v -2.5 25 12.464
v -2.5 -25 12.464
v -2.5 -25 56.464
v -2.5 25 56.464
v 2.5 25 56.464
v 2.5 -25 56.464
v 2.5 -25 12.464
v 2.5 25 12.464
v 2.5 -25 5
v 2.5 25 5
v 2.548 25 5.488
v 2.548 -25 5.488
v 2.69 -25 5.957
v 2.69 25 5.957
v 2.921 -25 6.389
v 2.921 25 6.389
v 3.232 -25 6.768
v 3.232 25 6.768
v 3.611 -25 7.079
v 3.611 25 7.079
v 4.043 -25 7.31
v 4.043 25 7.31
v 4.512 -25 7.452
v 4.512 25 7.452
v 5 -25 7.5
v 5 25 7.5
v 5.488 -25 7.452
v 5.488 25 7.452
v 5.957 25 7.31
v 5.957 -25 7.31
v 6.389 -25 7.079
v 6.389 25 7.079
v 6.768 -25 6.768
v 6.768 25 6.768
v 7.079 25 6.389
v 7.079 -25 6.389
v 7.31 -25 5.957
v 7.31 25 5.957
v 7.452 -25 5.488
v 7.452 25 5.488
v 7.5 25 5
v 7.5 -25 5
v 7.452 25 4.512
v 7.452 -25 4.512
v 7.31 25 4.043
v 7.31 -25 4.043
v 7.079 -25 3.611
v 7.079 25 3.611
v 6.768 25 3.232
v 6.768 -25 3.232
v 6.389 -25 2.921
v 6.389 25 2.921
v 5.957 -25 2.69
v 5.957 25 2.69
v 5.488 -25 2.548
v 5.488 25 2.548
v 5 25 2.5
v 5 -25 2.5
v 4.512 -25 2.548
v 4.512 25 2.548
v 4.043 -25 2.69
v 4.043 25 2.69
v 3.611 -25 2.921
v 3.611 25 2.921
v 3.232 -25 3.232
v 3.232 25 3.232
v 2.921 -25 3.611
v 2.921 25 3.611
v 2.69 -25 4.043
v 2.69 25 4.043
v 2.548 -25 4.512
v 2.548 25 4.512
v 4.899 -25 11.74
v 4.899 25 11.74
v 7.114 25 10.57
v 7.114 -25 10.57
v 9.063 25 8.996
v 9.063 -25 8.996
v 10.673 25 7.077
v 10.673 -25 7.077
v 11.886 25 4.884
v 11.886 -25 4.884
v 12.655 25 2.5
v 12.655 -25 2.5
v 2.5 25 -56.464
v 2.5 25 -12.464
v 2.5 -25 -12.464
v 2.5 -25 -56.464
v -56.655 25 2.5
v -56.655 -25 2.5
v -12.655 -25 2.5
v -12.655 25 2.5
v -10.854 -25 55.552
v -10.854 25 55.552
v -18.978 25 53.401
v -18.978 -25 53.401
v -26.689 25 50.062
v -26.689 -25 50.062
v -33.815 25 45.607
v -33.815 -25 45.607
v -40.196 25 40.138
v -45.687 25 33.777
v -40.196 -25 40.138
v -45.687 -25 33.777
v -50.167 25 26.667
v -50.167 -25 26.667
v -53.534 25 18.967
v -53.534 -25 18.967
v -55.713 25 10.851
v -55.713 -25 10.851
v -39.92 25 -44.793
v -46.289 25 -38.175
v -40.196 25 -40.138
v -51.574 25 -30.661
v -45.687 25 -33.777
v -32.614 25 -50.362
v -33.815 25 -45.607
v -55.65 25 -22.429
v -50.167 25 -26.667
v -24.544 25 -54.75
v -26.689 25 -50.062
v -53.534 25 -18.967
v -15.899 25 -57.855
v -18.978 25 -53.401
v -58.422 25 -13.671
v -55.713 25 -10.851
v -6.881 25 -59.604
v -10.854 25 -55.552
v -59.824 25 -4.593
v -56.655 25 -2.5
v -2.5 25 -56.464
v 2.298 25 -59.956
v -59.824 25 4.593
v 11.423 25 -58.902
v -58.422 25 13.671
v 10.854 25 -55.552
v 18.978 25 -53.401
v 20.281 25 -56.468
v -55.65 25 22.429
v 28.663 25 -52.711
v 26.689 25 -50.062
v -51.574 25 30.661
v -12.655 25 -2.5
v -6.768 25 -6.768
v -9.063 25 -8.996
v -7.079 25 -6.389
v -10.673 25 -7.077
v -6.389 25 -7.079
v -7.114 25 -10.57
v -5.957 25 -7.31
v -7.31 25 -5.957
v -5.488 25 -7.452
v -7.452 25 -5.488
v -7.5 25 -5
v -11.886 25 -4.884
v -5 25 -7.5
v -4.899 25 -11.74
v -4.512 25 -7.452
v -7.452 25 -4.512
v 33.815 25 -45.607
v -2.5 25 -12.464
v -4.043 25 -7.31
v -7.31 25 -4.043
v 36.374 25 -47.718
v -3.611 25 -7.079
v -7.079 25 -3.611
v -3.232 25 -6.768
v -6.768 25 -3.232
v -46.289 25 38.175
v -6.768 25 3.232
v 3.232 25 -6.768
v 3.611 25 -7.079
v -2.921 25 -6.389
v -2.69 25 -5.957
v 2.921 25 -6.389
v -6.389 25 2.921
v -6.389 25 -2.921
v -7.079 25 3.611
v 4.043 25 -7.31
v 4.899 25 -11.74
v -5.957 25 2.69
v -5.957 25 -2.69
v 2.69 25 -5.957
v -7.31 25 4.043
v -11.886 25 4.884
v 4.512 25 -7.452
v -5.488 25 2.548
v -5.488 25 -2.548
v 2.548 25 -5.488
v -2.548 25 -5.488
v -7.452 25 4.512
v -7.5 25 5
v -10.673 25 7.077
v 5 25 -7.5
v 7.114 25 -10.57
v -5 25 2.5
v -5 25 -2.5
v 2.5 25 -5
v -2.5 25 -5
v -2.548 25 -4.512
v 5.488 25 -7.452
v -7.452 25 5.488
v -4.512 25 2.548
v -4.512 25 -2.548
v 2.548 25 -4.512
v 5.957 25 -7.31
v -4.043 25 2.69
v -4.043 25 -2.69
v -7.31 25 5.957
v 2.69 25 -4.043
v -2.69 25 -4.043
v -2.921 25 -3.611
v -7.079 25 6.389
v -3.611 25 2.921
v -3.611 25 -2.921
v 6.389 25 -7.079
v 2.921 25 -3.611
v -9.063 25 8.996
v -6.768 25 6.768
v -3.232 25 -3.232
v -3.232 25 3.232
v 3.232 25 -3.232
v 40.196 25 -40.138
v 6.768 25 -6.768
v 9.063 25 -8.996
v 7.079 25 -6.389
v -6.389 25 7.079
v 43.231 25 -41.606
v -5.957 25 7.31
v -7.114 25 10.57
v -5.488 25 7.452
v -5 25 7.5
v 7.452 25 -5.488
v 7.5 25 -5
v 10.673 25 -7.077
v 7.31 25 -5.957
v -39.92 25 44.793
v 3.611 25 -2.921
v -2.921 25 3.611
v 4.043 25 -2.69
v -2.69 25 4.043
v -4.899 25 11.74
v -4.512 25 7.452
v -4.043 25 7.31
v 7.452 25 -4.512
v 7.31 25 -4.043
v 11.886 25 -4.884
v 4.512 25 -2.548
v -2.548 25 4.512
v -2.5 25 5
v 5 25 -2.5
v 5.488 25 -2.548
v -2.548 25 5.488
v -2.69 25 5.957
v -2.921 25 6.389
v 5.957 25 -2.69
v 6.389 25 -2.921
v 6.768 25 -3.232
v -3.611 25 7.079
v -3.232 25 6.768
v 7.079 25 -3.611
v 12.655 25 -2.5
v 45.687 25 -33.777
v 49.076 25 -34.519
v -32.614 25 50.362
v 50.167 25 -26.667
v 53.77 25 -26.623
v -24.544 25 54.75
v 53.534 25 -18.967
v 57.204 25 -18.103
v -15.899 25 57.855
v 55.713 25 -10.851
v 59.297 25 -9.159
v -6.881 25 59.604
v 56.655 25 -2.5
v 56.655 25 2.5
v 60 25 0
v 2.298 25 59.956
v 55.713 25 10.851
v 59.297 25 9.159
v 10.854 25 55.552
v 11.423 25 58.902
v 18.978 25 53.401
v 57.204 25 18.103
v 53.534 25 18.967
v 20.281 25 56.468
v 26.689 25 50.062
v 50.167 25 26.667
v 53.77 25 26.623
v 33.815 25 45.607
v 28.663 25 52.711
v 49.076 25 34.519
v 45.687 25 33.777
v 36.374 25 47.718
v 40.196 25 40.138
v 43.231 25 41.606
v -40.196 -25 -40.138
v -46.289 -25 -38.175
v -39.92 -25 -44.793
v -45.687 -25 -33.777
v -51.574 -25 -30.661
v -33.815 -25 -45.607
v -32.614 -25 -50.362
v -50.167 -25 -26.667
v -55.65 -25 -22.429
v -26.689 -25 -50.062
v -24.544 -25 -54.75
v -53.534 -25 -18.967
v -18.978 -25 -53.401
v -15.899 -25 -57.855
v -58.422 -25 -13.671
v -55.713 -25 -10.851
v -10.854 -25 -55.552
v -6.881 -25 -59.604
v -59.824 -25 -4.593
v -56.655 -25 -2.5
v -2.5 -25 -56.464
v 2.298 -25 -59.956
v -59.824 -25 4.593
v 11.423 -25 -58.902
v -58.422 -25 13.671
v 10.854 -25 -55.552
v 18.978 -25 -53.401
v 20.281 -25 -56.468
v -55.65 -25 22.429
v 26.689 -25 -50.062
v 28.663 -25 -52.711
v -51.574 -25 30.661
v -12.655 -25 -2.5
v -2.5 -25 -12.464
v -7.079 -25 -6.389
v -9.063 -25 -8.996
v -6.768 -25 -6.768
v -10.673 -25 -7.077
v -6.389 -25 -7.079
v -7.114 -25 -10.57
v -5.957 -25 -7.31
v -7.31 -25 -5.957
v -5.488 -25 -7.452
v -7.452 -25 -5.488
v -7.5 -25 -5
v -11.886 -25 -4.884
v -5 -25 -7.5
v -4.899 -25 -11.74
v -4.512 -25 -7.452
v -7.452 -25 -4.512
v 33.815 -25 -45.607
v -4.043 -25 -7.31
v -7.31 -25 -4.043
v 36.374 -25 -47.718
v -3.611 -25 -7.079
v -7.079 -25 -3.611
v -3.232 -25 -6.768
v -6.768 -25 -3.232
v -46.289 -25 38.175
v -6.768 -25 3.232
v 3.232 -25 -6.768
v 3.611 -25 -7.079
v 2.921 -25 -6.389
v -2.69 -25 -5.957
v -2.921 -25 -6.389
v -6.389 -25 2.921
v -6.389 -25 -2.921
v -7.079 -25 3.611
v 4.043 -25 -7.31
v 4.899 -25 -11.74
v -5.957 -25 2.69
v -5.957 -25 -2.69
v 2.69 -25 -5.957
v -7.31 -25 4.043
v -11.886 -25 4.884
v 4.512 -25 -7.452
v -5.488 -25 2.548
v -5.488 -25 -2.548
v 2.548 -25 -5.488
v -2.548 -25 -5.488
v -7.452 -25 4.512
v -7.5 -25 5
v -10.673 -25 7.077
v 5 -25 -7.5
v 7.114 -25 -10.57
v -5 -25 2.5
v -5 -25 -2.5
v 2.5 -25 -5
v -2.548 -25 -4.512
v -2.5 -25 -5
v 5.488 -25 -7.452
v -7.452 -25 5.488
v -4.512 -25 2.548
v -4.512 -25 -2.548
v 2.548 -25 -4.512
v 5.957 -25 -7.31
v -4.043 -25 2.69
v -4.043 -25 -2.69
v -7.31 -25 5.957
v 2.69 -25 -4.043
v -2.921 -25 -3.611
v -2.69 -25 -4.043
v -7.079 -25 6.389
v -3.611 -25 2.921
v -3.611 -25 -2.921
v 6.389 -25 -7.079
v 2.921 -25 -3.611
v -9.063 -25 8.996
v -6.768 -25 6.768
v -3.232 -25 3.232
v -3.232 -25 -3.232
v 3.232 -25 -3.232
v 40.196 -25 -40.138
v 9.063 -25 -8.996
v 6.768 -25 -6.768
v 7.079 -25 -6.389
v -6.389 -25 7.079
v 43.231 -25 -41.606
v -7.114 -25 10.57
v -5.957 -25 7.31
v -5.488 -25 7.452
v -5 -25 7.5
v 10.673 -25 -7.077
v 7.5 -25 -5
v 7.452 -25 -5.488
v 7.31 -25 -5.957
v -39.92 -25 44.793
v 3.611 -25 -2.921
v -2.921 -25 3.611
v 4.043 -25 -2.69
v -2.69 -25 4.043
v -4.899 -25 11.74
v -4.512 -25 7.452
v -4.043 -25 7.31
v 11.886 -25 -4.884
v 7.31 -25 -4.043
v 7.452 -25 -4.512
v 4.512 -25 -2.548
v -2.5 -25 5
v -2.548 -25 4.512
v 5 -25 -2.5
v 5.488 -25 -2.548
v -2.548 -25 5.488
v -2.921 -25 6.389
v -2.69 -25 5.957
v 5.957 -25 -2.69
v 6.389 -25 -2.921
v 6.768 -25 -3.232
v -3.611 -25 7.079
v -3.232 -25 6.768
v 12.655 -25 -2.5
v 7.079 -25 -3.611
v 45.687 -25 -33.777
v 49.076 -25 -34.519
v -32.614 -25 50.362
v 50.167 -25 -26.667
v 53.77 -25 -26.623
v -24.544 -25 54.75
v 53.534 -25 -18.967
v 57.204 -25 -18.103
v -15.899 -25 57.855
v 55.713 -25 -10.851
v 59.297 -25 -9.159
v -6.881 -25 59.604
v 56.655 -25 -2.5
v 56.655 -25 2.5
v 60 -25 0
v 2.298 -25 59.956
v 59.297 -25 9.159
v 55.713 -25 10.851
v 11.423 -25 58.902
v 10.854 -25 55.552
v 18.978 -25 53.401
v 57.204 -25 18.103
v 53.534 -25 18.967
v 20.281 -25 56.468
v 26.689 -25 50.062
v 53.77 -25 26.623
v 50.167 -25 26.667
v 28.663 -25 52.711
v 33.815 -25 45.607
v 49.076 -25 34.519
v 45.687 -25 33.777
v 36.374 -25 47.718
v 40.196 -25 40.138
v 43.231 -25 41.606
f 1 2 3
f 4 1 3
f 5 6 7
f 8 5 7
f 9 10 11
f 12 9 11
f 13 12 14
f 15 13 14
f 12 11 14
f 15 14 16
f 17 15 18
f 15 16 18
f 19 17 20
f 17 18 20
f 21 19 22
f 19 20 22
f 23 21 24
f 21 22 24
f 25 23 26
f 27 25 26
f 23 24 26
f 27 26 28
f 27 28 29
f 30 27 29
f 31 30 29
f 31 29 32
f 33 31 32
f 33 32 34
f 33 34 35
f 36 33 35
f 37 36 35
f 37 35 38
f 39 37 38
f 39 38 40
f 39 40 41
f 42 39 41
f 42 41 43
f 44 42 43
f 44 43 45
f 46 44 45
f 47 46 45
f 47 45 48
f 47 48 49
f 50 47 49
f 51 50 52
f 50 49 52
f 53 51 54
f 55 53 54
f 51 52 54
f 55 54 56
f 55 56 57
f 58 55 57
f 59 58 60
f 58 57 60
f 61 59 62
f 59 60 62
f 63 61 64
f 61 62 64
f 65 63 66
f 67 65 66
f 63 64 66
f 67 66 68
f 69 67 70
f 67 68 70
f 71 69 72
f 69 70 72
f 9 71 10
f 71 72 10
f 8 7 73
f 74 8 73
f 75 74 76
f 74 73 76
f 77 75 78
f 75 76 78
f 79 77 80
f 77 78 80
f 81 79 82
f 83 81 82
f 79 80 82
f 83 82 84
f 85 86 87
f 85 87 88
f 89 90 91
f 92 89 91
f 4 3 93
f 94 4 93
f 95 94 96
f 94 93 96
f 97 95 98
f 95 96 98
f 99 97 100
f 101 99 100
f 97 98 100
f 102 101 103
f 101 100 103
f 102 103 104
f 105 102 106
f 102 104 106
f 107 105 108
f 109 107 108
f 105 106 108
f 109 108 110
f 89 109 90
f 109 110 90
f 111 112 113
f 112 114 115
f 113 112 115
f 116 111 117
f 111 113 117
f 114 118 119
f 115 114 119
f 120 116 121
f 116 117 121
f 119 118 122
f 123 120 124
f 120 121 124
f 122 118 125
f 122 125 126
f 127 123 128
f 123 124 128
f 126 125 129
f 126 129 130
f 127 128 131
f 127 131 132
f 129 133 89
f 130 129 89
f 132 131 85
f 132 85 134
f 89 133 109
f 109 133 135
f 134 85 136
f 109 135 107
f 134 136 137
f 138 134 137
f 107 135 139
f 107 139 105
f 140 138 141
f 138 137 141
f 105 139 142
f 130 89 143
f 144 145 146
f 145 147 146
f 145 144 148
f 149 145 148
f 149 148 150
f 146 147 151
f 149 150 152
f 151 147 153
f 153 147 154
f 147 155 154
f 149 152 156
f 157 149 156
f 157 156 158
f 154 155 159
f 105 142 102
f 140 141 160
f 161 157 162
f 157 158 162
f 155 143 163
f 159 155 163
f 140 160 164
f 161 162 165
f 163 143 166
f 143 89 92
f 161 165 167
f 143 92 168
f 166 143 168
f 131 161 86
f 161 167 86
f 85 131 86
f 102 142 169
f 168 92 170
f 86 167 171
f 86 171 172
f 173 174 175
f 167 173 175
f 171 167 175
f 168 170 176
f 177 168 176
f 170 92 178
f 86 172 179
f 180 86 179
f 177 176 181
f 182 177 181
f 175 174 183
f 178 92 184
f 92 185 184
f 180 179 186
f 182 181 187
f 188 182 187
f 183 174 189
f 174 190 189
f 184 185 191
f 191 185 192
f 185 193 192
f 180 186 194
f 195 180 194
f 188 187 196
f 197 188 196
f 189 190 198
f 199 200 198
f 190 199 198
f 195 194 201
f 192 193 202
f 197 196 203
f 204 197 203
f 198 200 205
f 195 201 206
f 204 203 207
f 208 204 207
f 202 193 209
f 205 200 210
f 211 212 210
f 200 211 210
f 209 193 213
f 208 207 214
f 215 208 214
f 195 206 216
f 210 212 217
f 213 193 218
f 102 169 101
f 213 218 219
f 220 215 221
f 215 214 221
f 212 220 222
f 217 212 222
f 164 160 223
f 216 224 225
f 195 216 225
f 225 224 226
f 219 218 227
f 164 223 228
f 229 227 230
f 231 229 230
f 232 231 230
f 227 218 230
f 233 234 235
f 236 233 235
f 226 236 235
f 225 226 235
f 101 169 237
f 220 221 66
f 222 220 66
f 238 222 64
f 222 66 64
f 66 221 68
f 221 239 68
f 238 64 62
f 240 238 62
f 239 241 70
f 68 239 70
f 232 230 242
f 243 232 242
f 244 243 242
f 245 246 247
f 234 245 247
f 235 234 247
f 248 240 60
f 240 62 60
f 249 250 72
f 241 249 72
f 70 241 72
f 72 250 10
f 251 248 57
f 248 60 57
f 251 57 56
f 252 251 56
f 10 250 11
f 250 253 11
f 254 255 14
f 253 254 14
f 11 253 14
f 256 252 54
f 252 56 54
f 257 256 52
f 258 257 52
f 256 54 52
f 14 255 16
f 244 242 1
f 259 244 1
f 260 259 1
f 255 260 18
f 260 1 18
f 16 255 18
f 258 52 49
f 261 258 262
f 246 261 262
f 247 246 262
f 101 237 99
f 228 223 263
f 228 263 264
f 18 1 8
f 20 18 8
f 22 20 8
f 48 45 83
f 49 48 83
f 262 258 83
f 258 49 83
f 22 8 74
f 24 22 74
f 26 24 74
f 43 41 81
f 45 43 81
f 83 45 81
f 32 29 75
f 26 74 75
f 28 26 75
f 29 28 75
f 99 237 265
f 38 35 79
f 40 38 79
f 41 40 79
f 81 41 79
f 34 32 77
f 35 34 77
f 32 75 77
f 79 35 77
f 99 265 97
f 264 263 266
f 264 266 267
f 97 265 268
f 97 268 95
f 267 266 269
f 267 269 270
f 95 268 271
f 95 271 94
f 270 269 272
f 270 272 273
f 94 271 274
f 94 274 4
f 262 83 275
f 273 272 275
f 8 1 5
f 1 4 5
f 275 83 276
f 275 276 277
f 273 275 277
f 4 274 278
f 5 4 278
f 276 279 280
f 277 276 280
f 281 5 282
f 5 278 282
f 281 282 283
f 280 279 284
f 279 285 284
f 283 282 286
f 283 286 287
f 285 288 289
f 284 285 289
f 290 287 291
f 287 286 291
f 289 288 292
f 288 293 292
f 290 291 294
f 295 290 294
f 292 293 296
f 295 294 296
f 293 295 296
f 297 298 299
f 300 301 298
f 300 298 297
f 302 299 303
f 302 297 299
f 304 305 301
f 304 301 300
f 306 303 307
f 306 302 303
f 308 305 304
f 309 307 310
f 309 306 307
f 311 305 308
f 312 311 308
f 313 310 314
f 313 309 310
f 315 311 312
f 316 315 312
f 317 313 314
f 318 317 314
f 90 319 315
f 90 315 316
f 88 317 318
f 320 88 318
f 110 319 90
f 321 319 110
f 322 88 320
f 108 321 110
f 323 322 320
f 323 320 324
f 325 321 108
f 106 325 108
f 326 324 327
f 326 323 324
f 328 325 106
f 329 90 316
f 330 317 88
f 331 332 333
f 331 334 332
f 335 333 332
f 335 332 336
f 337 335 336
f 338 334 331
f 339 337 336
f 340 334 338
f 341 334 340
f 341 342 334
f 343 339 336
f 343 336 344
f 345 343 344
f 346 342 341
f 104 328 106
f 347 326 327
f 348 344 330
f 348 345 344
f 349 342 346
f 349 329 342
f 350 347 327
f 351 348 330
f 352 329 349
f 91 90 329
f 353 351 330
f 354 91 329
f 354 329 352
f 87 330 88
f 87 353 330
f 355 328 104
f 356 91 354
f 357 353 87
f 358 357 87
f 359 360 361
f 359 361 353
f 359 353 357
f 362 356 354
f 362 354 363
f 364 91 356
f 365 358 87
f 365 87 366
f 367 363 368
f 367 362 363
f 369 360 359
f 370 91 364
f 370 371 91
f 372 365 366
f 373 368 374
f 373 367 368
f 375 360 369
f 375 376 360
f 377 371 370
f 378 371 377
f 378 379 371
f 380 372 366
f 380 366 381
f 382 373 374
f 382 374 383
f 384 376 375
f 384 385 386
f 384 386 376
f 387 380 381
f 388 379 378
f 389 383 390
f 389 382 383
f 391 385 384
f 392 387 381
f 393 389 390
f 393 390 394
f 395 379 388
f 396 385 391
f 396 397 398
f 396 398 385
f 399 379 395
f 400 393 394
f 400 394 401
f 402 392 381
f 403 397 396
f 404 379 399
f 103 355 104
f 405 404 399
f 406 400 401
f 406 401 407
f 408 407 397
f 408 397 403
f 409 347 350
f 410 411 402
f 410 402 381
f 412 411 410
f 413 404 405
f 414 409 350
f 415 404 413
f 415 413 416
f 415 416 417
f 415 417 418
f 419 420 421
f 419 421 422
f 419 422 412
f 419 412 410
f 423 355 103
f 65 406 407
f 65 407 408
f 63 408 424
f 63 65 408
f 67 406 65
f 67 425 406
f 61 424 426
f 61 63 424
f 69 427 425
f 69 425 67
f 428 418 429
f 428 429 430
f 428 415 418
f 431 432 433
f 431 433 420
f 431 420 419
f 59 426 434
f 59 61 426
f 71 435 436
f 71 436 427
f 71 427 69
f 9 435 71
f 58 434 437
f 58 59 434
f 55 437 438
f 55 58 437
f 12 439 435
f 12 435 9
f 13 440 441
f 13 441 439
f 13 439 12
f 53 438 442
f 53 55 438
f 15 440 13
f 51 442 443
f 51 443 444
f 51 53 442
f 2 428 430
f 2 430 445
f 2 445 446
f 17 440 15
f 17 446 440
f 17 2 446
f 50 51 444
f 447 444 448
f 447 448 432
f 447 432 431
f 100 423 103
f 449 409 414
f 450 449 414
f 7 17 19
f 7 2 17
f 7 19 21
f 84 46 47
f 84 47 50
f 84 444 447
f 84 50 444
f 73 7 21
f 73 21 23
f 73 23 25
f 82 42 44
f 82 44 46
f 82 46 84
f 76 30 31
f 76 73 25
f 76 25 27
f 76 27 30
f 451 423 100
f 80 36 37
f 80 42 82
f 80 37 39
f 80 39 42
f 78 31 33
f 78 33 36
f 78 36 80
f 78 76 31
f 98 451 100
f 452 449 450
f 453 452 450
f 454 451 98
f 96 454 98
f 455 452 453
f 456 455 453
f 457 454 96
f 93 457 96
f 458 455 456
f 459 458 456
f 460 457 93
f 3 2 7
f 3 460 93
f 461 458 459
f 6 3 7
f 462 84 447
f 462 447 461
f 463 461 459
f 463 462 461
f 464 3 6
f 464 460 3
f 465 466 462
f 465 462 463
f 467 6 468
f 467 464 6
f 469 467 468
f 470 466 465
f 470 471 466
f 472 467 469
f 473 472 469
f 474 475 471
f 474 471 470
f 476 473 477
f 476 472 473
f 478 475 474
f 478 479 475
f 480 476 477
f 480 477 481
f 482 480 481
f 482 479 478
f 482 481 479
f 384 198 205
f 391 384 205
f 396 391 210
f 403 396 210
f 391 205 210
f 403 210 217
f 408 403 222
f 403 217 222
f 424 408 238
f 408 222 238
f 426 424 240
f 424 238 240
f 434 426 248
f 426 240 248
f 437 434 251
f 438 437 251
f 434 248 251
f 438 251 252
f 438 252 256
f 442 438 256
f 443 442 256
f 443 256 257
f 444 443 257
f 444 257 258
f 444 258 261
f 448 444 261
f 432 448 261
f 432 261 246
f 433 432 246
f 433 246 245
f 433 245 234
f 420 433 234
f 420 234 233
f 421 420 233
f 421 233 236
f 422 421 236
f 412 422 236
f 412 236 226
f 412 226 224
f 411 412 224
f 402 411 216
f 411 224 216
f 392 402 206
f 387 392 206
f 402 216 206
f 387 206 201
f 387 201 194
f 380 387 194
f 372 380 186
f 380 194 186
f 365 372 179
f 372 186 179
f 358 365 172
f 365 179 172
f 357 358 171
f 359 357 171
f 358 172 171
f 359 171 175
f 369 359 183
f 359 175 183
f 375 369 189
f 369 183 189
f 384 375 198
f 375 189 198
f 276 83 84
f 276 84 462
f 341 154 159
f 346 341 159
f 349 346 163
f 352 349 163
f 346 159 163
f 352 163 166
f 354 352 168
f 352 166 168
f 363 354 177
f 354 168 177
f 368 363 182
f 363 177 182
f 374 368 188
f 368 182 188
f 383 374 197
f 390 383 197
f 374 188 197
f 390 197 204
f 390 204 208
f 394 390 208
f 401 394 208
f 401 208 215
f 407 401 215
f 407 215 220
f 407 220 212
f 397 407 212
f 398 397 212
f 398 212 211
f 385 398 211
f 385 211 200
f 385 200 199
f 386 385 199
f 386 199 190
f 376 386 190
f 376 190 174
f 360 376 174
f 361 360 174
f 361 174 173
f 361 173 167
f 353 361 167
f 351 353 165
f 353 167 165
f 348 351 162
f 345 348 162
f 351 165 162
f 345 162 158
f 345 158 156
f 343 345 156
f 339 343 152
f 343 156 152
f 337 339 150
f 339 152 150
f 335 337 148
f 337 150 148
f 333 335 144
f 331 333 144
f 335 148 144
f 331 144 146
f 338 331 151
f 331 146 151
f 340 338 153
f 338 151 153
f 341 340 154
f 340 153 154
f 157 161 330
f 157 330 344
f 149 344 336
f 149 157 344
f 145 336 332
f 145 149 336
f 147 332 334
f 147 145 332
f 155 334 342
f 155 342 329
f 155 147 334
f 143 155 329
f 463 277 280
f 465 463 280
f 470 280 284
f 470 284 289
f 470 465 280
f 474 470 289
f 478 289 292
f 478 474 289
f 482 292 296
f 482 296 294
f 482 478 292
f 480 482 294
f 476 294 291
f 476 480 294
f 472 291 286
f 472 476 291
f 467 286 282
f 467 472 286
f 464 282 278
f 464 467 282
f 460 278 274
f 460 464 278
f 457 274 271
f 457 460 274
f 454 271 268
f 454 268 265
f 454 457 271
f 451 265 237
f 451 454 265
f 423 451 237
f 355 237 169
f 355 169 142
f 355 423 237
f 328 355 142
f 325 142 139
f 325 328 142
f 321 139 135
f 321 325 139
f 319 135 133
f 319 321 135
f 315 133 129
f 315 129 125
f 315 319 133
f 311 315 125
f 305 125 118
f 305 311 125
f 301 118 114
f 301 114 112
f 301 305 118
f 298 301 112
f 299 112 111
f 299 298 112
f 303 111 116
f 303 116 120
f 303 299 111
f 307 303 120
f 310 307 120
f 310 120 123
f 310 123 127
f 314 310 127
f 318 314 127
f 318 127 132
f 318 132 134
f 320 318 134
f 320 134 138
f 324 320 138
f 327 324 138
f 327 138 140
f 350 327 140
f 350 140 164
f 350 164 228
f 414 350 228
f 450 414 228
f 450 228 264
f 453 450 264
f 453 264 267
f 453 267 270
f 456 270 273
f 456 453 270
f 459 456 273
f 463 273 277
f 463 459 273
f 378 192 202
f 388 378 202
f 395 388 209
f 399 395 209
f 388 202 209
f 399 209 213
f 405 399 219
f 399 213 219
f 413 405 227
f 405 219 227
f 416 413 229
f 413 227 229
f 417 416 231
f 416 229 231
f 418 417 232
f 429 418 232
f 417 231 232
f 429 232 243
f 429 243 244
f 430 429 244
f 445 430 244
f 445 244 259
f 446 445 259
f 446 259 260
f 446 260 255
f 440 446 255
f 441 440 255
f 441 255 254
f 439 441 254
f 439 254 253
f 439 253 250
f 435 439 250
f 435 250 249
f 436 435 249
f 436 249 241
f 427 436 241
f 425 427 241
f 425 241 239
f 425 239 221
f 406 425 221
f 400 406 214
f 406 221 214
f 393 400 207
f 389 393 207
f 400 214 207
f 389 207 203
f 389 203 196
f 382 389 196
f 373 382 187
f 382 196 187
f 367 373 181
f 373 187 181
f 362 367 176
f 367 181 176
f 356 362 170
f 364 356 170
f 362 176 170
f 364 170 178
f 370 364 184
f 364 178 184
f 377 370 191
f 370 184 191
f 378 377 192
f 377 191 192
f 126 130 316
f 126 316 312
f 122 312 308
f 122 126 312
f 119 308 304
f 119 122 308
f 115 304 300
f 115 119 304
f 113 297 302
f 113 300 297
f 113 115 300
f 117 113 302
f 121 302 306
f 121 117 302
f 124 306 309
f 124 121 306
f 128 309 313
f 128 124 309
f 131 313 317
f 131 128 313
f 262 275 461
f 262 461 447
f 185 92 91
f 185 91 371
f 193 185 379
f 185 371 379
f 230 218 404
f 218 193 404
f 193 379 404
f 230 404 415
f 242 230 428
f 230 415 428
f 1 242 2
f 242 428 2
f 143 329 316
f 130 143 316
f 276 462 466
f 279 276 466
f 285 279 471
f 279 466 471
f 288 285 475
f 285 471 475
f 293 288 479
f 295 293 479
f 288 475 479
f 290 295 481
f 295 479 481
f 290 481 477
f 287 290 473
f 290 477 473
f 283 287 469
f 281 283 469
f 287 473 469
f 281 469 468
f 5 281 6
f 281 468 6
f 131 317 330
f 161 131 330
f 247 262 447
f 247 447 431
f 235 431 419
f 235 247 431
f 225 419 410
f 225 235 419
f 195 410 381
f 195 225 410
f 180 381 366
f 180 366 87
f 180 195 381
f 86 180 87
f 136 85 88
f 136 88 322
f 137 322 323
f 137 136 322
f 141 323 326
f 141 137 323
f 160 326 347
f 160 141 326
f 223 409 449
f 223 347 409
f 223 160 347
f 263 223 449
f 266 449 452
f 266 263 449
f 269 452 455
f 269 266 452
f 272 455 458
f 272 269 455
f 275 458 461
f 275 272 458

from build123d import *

# Parameters (mm, degrees)
F0_R     = 60
F1_DEPTH = 25
F4_DEPTH = 50.6
F5_DEPTH = 50
F6_D     = 5


with BuildPart() as f1:
    # F0 (on Front) → F1 (new body, symmetric)
    with BuildSketch(Plane.XZ):
        Circle(F0_R)
    extrude(amount=F1_DEPTH, both=True)

    # F3 (on offset) → F4 (cut, symmetric)
    with BuildSketch(Plane.XZ.offset(25)):
        with BuildLine():
            ThreePointArc((-12.654677, 2.5), (-9.062737, 8.995834), (-2.5, 12.46403))
            Line((-2.5, 12.46403), (-2.5, 56.46403))
            ThreePointArc((-2.5, 56.46403), (-40.195659, 40.137848), (-56.654677, 2.5))
            Line((-56.654677, 2.5), (-12.654677, 2.5))
        make_face()
    extrude(amount=F4_DEPTH, both=True, mode=Mode.SUBTRACT)

    # F3 (on offset) → F5 (cut, symmetric)
    with BuildSketch(Plane.XZ.offset(25)):
        with BuildLine():
            Line((-12.654677, -2.5), (-56.654677, -2.5))
            ThreePointArc((-56.654677, -2.5), (-40.195659, -40.137848), (-2.5, -56.46403))
            Line((-2.5, -56.46403), (-2.5, -12.46403))
            ThreePointArc((-2.5, -12.46403), (-9.062737, -8.995834), (-12.654677, -2.5))
        make_face()
        with BuildLine():
            ThreePointArc((12.654677, -2.5), (9.062737, -8.995834), (2.5, -12.46403))
            Line((2.5, -12.46403), (2.5, -56.46403))
            ThreePointArc((2.5, -56.46403), (40.195659, -40.137848), (56.654677, -2.5))
            Line((56.654677, -2.5), (12.654677, -2.5))
        make_face()
        with BuildLine():
            ThreePointArc((56.654677, 2.5), (40.195659, 40.137848), (2.5, 56.46403))
            Line((2.5, 56.46403), (2.5, 12.46403))
            ThreePointArc((2.5, 12.46403), (9.062737, 8.995834), (12.654677, 2.5))
            Line((12.654677, 2.5), (56.654677, 2.5))
        make_face()
    extrude(amount=F5_DEPTH, both=True, mode=Mode.SUBTRACT)

    # F6 (through all)
    with Locations(Plane.XZ.offset(25)):
        with Locations((-5, -5), (-5, 5), (5, 5), (5, -5)):
            Hole(F6_D / 2)


solid = f1.part
